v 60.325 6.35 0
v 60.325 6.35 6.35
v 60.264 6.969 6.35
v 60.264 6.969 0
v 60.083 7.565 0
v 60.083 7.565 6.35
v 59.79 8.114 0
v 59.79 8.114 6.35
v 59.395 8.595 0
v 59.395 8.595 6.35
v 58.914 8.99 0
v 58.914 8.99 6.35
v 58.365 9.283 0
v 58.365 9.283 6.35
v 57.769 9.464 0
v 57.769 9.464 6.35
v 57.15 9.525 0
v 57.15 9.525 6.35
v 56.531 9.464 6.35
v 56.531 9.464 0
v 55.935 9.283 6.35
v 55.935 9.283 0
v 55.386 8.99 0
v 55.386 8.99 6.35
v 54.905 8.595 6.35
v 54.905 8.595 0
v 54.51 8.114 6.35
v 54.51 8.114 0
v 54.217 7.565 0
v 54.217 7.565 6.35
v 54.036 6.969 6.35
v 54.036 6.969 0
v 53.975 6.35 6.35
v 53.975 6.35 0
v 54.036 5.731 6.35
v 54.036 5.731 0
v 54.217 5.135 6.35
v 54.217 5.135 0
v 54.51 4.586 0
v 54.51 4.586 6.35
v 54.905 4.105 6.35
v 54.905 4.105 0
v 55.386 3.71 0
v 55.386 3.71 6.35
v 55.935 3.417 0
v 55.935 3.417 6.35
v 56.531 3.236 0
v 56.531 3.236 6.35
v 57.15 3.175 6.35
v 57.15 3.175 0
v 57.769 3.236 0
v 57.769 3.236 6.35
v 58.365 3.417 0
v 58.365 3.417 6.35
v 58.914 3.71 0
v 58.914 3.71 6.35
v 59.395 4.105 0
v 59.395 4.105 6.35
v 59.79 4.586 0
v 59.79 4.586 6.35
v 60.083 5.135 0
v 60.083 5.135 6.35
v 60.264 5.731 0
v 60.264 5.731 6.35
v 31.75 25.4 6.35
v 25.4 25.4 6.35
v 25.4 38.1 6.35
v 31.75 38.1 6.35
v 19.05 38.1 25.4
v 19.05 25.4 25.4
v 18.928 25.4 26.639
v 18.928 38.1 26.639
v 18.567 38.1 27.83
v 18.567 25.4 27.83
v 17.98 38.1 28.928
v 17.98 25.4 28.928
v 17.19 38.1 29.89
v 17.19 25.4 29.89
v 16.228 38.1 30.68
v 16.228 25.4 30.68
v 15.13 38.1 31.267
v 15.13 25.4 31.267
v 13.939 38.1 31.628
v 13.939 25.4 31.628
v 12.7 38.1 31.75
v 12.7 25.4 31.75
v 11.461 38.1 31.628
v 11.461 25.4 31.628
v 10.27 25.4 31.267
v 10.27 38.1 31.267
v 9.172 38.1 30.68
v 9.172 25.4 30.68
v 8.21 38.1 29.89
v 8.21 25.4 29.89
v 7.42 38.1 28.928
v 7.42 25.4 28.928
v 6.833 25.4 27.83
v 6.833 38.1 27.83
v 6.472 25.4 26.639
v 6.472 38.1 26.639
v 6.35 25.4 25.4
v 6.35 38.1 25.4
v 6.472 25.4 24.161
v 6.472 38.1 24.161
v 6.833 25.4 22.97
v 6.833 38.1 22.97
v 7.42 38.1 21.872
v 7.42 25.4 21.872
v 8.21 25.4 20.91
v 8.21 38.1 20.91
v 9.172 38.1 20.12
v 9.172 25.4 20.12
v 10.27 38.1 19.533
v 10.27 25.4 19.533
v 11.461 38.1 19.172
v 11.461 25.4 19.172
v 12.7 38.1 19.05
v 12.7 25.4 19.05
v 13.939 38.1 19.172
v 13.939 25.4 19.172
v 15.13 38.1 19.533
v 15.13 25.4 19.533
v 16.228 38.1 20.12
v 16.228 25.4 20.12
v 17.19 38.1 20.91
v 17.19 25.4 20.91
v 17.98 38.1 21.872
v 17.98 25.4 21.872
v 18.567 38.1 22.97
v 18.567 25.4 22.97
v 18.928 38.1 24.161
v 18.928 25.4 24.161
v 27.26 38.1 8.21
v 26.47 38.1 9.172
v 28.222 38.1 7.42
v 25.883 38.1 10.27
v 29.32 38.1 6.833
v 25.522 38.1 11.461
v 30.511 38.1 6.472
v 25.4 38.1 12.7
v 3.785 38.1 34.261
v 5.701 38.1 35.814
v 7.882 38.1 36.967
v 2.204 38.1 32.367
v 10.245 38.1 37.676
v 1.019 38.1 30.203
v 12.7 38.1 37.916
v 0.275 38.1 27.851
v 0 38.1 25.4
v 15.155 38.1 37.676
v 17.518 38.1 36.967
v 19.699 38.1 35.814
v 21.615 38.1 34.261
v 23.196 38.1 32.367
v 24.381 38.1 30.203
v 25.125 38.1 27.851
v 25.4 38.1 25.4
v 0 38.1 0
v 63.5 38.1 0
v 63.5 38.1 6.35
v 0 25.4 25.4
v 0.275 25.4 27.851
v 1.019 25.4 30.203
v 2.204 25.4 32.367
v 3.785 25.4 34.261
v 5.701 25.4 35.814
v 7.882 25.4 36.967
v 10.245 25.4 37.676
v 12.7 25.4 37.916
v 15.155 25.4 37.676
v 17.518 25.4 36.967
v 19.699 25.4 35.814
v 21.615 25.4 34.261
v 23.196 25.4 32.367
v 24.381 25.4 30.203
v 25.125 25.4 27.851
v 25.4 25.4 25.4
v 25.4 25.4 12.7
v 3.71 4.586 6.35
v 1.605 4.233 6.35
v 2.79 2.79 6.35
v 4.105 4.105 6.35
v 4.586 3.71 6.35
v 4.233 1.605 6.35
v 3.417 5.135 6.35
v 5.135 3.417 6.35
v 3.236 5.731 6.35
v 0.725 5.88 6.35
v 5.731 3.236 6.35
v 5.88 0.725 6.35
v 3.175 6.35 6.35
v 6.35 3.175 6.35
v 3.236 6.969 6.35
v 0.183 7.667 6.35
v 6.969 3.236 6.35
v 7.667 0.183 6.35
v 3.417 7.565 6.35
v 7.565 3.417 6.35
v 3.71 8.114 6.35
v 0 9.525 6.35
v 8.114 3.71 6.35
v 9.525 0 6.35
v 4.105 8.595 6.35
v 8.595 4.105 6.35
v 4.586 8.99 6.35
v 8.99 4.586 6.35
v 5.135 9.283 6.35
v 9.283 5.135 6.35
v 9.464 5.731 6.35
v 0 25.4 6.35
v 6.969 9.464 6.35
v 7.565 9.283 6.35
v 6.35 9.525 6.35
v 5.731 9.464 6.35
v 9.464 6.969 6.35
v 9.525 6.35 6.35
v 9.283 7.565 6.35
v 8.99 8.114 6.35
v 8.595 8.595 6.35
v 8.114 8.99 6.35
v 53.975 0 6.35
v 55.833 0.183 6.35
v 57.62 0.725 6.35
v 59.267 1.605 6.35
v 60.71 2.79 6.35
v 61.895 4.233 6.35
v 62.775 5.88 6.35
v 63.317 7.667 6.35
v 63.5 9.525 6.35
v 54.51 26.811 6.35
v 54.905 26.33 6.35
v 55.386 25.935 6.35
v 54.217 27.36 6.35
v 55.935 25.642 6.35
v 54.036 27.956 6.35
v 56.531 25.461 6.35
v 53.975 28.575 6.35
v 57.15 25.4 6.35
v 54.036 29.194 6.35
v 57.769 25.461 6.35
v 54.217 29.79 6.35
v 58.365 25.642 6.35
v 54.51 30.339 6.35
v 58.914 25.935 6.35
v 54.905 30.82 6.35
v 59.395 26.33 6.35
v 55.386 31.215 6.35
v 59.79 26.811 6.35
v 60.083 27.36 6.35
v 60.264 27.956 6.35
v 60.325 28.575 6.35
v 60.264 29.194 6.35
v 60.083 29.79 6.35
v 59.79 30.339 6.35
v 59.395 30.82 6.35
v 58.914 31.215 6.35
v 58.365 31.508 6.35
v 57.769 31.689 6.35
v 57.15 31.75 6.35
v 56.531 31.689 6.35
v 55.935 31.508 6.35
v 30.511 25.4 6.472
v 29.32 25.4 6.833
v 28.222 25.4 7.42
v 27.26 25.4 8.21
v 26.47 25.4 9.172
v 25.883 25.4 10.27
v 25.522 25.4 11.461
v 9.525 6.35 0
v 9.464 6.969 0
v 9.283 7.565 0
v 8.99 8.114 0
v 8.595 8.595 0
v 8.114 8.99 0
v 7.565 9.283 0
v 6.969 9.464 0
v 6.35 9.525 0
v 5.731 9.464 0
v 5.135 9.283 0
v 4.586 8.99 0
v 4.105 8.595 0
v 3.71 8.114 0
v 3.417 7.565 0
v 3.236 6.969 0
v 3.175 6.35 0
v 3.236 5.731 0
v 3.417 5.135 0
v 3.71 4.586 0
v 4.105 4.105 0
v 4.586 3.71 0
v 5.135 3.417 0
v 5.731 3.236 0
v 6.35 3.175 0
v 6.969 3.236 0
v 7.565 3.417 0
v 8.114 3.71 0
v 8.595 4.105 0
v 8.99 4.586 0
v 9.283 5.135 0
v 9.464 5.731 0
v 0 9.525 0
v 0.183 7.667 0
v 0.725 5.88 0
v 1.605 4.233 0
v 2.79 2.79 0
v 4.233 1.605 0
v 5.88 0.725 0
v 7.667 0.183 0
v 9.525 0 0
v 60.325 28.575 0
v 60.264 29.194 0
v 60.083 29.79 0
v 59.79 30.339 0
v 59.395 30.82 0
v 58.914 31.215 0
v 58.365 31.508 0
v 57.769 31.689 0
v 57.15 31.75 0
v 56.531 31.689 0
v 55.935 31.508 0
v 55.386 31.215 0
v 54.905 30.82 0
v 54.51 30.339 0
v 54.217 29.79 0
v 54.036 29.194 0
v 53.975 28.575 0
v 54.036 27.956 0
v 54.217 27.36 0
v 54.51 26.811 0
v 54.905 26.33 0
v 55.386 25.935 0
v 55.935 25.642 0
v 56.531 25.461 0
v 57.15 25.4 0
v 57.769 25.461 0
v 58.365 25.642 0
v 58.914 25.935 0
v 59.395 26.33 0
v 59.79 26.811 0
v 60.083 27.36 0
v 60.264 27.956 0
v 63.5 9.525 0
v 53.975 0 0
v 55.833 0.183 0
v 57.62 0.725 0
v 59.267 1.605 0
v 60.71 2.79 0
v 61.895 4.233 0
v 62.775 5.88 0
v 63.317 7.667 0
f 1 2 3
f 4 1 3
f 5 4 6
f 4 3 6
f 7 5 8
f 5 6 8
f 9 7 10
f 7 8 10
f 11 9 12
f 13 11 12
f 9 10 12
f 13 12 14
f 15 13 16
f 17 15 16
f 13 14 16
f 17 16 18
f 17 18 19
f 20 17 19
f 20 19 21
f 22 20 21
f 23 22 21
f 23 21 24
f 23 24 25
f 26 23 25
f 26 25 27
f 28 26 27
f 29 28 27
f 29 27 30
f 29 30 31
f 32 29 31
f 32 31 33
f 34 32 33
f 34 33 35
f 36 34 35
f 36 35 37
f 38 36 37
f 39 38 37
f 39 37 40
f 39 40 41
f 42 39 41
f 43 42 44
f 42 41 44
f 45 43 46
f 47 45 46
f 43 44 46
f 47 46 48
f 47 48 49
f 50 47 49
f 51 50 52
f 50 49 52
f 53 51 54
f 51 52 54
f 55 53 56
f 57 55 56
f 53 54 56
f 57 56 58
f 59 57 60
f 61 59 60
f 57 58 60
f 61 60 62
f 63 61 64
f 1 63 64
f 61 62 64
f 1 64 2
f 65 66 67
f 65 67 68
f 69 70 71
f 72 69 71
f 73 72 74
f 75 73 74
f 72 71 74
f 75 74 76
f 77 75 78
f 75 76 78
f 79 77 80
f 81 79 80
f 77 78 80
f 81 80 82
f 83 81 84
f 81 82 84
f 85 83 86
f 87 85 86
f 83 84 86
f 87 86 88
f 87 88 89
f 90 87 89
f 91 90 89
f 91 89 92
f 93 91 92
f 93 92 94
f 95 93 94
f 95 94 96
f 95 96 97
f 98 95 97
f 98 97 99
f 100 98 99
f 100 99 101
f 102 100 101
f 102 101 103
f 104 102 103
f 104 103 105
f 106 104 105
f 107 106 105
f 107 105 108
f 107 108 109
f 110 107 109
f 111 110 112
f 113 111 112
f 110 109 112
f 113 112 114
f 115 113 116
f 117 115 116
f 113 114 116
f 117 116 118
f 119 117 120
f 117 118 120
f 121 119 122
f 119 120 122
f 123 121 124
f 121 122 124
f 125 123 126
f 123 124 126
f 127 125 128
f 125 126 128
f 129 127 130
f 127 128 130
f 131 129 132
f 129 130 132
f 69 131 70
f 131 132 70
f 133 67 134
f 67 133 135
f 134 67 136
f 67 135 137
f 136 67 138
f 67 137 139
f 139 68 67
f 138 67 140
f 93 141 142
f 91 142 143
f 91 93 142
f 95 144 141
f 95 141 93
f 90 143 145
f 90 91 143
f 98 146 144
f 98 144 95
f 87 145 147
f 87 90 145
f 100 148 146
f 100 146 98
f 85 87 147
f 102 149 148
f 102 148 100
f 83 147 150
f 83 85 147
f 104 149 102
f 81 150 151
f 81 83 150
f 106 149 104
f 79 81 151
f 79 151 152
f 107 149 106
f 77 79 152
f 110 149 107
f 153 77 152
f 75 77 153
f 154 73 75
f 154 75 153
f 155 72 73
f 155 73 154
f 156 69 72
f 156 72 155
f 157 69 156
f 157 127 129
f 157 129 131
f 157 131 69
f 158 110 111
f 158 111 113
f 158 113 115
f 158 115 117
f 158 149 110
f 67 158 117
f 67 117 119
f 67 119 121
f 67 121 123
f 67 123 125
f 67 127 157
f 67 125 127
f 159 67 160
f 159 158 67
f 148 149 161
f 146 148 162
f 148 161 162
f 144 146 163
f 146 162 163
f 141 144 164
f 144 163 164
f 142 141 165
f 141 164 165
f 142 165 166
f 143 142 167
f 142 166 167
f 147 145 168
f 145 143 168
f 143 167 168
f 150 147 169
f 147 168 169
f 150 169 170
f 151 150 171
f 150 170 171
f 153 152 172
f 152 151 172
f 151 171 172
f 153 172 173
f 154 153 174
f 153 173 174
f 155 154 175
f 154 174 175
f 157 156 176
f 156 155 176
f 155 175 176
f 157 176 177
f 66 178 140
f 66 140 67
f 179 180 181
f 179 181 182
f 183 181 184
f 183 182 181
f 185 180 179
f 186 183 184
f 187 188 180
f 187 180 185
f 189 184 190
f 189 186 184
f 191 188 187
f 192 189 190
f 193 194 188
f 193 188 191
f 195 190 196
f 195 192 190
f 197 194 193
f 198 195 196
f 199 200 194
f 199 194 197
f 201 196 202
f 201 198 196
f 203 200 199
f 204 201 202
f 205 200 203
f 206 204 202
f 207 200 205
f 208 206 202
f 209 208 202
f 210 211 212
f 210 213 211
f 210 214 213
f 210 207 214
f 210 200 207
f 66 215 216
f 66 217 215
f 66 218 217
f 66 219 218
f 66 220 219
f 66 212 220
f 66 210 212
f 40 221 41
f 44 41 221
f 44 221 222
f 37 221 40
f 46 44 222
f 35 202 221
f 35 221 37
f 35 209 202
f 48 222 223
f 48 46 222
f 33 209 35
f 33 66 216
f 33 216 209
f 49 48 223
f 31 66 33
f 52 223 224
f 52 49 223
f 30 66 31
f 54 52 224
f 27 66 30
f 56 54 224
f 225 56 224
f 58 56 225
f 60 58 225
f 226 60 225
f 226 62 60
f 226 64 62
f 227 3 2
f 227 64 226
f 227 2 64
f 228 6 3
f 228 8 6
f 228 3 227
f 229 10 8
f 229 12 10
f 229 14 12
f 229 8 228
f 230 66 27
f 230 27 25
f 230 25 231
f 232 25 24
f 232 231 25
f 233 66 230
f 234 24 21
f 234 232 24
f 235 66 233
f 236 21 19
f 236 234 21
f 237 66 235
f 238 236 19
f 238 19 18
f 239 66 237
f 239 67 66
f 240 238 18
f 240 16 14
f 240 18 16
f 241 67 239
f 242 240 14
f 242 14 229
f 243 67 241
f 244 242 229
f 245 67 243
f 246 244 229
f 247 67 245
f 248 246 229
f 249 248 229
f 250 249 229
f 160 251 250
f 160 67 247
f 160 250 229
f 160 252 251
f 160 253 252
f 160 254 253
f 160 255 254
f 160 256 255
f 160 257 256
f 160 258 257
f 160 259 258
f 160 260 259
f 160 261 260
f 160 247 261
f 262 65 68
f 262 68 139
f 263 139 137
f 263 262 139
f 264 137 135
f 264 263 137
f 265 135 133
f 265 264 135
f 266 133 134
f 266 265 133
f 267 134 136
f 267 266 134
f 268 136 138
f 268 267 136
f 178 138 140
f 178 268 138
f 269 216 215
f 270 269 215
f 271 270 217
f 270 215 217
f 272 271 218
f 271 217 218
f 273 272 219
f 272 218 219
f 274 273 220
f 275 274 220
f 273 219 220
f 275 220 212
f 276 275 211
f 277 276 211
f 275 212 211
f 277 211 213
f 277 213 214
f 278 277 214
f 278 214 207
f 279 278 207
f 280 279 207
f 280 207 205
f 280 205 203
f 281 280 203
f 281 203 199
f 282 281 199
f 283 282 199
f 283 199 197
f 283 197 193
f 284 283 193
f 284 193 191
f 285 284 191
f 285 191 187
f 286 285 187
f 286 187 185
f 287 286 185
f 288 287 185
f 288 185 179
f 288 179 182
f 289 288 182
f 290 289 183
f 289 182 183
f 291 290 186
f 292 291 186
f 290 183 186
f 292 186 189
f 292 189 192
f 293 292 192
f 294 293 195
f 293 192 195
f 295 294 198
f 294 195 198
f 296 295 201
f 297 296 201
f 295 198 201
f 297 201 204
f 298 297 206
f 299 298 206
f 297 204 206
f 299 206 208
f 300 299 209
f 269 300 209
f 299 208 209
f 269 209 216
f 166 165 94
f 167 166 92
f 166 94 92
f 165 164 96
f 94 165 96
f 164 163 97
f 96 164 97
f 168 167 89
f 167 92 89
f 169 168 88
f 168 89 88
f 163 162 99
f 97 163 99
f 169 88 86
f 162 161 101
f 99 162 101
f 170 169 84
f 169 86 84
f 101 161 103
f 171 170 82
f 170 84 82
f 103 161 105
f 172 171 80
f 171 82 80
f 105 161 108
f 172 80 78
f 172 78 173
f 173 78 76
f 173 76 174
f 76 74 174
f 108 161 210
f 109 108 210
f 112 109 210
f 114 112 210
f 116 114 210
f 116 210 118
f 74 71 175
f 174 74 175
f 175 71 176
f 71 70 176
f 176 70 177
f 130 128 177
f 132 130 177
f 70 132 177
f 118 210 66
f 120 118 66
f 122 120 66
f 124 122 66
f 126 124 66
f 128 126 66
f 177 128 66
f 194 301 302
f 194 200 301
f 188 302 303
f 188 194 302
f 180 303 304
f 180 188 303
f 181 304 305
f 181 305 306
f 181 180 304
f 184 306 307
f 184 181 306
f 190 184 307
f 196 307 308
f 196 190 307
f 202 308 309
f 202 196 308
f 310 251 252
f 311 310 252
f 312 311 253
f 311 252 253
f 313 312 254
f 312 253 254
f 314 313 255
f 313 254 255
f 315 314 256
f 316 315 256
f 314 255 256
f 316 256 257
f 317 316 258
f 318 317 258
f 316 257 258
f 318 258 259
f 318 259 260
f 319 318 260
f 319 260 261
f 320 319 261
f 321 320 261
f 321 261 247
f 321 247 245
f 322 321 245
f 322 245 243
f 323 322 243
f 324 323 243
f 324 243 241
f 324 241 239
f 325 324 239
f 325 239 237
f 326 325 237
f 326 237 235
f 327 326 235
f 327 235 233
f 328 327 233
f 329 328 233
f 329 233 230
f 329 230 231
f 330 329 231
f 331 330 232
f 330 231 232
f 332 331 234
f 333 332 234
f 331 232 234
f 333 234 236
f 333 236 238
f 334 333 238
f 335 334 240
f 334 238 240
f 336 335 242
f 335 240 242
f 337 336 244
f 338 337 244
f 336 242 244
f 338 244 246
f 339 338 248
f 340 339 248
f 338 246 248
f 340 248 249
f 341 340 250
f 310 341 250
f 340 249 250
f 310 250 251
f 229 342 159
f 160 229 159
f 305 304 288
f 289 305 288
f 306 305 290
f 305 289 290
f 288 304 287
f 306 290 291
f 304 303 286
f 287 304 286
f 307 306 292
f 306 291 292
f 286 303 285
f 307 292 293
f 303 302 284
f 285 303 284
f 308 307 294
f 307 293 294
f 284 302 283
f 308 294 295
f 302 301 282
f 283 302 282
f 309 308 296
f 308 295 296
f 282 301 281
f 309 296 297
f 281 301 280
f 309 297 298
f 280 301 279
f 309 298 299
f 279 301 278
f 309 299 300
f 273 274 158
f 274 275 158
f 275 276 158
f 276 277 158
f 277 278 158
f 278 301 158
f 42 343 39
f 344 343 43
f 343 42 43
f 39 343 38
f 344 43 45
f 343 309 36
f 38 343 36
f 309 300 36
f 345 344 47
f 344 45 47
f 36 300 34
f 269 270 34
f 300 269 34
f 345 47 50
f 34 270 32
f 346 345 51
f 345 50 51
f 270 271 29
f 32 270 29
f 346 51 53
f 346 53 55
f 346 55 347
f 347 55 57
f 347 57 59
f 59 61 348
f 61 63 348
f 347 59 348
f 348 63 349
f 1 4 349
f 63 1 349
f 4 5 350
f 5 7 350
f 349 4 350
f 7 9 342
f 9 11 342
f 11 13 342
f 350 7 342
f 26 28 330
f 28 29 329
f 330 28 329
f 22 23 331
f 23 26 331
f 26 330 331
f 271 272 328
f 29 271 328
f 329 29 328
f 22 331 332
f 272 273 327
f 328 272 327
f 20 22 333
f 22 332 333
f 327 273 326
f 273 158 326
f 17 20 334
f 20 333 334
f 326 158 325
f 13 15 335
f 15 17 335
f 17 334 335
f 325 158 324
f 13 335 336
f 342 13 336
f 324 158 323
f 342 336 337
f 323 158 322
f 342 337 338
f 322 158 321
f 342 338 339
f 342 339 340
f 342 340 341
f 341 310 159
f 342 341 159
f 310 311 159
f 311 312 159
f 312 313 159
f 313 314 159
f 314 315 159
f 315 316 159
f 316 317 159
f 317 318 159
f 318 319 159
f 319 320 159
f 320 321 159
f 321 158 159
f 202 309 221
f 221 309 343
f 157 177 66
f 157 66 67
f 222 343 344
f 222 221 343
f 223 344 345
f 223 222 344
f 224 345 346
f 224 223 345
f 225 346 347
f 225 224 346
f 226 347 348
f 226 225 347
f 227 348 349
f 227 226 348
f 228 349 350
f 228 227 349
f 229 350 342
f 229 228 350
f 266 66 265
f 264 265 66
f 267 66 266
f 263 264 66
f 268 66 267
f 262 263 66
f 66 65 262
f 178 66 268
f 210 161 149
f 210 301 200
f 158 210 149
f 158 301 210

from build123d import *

# Parameters (mm, degrees)
F0_W     = 63.5
F0_H     = 38.1
F1_DEPTH = 6.35
F2_R     = 3.175
F3_DEPTH = 25.4
F4_W     = 25.4
F4_H     = 12.7
F5_DEPTH = 31.75
F6_R     = 6.35
F7_DEPTH = 25.4
F9_DEPTH = 12.7
F10_R    = 9.525


with BuildPart() as f1:
    # F0 (on Top) → F1 (new body)
    with BuildSketch(Plane.XY):
        with Locations((31.75, 19.05)):
            Rectangle(F0_W, F0_H)
    extrude(amount=F1_DEPTH)

    # F2 (on face) → F3 (cut)
    with BuildSketch(Plane.XY.offset(6.35)):
        with Locations((6.35, 6.35)):
            Circle(F2_R)
        with Locations((57.15, 6.35)):
            Circle(F2_R)
        with Locations((57.15, 28.575)):
            Circle(F2_R)
    extrude(amount=-F3_DEPTH, mode=Mode.SUBTRACT)

    # F4 (on face) → F5 (join)
    with BuildSketch(Plane.XY.offset(6.35)):
        with Locations((12.7, 31.75)):
            Rectangle(F4_W, F4_H)
    extrude(amount=F5_DEPTH)

    # F6 (on face) → F7 (cut)
    with BuildSketch(Plane.XZ.offset(-25.4)):
        with Locations((12.7, 25.4)):
            Circle(F6_R)
        with BuildLine():
            ThreePointArc((0, 25.4), (12.7, 37.9157663144), (25.4, 25.4))
            Line((25.4, 25.4), (25.4, 38.1))
            Line((25.4, 38.1), (0, 38.1))
            Line((0, 38.1), (0, 25.4))
        make_face()
    extrude(amount=-F7_DEPTH, mode=Mode.SUBTRACT)

    # F10
    f10_edges = [f1.edges().sort_by_distance(p)[0] for p in [
        (63.5, 0, 3.175),
        (0, 0, 3.175),
    ]]
    fillet(f10_edges, radius=F10_R)


with BuildPart() as f9:
    # F8 (on face) → F9 (new body)
    with BuildSketch(Plane.XZ.offset(-25.4)):
        with BuildLine():
            Line((25.4, 6.35), (31.75, 6.35))
            ThreePointArc((31.75, 6.35), (27.2598719395, 8.2098719395), (25.4, 12.7))
            Line((25.4, 12.7), (25.4, 6.35))
        make_face()
    extrude(amount=-F9_DEPTH)


solid = Compound([f1.part, f9.part])
